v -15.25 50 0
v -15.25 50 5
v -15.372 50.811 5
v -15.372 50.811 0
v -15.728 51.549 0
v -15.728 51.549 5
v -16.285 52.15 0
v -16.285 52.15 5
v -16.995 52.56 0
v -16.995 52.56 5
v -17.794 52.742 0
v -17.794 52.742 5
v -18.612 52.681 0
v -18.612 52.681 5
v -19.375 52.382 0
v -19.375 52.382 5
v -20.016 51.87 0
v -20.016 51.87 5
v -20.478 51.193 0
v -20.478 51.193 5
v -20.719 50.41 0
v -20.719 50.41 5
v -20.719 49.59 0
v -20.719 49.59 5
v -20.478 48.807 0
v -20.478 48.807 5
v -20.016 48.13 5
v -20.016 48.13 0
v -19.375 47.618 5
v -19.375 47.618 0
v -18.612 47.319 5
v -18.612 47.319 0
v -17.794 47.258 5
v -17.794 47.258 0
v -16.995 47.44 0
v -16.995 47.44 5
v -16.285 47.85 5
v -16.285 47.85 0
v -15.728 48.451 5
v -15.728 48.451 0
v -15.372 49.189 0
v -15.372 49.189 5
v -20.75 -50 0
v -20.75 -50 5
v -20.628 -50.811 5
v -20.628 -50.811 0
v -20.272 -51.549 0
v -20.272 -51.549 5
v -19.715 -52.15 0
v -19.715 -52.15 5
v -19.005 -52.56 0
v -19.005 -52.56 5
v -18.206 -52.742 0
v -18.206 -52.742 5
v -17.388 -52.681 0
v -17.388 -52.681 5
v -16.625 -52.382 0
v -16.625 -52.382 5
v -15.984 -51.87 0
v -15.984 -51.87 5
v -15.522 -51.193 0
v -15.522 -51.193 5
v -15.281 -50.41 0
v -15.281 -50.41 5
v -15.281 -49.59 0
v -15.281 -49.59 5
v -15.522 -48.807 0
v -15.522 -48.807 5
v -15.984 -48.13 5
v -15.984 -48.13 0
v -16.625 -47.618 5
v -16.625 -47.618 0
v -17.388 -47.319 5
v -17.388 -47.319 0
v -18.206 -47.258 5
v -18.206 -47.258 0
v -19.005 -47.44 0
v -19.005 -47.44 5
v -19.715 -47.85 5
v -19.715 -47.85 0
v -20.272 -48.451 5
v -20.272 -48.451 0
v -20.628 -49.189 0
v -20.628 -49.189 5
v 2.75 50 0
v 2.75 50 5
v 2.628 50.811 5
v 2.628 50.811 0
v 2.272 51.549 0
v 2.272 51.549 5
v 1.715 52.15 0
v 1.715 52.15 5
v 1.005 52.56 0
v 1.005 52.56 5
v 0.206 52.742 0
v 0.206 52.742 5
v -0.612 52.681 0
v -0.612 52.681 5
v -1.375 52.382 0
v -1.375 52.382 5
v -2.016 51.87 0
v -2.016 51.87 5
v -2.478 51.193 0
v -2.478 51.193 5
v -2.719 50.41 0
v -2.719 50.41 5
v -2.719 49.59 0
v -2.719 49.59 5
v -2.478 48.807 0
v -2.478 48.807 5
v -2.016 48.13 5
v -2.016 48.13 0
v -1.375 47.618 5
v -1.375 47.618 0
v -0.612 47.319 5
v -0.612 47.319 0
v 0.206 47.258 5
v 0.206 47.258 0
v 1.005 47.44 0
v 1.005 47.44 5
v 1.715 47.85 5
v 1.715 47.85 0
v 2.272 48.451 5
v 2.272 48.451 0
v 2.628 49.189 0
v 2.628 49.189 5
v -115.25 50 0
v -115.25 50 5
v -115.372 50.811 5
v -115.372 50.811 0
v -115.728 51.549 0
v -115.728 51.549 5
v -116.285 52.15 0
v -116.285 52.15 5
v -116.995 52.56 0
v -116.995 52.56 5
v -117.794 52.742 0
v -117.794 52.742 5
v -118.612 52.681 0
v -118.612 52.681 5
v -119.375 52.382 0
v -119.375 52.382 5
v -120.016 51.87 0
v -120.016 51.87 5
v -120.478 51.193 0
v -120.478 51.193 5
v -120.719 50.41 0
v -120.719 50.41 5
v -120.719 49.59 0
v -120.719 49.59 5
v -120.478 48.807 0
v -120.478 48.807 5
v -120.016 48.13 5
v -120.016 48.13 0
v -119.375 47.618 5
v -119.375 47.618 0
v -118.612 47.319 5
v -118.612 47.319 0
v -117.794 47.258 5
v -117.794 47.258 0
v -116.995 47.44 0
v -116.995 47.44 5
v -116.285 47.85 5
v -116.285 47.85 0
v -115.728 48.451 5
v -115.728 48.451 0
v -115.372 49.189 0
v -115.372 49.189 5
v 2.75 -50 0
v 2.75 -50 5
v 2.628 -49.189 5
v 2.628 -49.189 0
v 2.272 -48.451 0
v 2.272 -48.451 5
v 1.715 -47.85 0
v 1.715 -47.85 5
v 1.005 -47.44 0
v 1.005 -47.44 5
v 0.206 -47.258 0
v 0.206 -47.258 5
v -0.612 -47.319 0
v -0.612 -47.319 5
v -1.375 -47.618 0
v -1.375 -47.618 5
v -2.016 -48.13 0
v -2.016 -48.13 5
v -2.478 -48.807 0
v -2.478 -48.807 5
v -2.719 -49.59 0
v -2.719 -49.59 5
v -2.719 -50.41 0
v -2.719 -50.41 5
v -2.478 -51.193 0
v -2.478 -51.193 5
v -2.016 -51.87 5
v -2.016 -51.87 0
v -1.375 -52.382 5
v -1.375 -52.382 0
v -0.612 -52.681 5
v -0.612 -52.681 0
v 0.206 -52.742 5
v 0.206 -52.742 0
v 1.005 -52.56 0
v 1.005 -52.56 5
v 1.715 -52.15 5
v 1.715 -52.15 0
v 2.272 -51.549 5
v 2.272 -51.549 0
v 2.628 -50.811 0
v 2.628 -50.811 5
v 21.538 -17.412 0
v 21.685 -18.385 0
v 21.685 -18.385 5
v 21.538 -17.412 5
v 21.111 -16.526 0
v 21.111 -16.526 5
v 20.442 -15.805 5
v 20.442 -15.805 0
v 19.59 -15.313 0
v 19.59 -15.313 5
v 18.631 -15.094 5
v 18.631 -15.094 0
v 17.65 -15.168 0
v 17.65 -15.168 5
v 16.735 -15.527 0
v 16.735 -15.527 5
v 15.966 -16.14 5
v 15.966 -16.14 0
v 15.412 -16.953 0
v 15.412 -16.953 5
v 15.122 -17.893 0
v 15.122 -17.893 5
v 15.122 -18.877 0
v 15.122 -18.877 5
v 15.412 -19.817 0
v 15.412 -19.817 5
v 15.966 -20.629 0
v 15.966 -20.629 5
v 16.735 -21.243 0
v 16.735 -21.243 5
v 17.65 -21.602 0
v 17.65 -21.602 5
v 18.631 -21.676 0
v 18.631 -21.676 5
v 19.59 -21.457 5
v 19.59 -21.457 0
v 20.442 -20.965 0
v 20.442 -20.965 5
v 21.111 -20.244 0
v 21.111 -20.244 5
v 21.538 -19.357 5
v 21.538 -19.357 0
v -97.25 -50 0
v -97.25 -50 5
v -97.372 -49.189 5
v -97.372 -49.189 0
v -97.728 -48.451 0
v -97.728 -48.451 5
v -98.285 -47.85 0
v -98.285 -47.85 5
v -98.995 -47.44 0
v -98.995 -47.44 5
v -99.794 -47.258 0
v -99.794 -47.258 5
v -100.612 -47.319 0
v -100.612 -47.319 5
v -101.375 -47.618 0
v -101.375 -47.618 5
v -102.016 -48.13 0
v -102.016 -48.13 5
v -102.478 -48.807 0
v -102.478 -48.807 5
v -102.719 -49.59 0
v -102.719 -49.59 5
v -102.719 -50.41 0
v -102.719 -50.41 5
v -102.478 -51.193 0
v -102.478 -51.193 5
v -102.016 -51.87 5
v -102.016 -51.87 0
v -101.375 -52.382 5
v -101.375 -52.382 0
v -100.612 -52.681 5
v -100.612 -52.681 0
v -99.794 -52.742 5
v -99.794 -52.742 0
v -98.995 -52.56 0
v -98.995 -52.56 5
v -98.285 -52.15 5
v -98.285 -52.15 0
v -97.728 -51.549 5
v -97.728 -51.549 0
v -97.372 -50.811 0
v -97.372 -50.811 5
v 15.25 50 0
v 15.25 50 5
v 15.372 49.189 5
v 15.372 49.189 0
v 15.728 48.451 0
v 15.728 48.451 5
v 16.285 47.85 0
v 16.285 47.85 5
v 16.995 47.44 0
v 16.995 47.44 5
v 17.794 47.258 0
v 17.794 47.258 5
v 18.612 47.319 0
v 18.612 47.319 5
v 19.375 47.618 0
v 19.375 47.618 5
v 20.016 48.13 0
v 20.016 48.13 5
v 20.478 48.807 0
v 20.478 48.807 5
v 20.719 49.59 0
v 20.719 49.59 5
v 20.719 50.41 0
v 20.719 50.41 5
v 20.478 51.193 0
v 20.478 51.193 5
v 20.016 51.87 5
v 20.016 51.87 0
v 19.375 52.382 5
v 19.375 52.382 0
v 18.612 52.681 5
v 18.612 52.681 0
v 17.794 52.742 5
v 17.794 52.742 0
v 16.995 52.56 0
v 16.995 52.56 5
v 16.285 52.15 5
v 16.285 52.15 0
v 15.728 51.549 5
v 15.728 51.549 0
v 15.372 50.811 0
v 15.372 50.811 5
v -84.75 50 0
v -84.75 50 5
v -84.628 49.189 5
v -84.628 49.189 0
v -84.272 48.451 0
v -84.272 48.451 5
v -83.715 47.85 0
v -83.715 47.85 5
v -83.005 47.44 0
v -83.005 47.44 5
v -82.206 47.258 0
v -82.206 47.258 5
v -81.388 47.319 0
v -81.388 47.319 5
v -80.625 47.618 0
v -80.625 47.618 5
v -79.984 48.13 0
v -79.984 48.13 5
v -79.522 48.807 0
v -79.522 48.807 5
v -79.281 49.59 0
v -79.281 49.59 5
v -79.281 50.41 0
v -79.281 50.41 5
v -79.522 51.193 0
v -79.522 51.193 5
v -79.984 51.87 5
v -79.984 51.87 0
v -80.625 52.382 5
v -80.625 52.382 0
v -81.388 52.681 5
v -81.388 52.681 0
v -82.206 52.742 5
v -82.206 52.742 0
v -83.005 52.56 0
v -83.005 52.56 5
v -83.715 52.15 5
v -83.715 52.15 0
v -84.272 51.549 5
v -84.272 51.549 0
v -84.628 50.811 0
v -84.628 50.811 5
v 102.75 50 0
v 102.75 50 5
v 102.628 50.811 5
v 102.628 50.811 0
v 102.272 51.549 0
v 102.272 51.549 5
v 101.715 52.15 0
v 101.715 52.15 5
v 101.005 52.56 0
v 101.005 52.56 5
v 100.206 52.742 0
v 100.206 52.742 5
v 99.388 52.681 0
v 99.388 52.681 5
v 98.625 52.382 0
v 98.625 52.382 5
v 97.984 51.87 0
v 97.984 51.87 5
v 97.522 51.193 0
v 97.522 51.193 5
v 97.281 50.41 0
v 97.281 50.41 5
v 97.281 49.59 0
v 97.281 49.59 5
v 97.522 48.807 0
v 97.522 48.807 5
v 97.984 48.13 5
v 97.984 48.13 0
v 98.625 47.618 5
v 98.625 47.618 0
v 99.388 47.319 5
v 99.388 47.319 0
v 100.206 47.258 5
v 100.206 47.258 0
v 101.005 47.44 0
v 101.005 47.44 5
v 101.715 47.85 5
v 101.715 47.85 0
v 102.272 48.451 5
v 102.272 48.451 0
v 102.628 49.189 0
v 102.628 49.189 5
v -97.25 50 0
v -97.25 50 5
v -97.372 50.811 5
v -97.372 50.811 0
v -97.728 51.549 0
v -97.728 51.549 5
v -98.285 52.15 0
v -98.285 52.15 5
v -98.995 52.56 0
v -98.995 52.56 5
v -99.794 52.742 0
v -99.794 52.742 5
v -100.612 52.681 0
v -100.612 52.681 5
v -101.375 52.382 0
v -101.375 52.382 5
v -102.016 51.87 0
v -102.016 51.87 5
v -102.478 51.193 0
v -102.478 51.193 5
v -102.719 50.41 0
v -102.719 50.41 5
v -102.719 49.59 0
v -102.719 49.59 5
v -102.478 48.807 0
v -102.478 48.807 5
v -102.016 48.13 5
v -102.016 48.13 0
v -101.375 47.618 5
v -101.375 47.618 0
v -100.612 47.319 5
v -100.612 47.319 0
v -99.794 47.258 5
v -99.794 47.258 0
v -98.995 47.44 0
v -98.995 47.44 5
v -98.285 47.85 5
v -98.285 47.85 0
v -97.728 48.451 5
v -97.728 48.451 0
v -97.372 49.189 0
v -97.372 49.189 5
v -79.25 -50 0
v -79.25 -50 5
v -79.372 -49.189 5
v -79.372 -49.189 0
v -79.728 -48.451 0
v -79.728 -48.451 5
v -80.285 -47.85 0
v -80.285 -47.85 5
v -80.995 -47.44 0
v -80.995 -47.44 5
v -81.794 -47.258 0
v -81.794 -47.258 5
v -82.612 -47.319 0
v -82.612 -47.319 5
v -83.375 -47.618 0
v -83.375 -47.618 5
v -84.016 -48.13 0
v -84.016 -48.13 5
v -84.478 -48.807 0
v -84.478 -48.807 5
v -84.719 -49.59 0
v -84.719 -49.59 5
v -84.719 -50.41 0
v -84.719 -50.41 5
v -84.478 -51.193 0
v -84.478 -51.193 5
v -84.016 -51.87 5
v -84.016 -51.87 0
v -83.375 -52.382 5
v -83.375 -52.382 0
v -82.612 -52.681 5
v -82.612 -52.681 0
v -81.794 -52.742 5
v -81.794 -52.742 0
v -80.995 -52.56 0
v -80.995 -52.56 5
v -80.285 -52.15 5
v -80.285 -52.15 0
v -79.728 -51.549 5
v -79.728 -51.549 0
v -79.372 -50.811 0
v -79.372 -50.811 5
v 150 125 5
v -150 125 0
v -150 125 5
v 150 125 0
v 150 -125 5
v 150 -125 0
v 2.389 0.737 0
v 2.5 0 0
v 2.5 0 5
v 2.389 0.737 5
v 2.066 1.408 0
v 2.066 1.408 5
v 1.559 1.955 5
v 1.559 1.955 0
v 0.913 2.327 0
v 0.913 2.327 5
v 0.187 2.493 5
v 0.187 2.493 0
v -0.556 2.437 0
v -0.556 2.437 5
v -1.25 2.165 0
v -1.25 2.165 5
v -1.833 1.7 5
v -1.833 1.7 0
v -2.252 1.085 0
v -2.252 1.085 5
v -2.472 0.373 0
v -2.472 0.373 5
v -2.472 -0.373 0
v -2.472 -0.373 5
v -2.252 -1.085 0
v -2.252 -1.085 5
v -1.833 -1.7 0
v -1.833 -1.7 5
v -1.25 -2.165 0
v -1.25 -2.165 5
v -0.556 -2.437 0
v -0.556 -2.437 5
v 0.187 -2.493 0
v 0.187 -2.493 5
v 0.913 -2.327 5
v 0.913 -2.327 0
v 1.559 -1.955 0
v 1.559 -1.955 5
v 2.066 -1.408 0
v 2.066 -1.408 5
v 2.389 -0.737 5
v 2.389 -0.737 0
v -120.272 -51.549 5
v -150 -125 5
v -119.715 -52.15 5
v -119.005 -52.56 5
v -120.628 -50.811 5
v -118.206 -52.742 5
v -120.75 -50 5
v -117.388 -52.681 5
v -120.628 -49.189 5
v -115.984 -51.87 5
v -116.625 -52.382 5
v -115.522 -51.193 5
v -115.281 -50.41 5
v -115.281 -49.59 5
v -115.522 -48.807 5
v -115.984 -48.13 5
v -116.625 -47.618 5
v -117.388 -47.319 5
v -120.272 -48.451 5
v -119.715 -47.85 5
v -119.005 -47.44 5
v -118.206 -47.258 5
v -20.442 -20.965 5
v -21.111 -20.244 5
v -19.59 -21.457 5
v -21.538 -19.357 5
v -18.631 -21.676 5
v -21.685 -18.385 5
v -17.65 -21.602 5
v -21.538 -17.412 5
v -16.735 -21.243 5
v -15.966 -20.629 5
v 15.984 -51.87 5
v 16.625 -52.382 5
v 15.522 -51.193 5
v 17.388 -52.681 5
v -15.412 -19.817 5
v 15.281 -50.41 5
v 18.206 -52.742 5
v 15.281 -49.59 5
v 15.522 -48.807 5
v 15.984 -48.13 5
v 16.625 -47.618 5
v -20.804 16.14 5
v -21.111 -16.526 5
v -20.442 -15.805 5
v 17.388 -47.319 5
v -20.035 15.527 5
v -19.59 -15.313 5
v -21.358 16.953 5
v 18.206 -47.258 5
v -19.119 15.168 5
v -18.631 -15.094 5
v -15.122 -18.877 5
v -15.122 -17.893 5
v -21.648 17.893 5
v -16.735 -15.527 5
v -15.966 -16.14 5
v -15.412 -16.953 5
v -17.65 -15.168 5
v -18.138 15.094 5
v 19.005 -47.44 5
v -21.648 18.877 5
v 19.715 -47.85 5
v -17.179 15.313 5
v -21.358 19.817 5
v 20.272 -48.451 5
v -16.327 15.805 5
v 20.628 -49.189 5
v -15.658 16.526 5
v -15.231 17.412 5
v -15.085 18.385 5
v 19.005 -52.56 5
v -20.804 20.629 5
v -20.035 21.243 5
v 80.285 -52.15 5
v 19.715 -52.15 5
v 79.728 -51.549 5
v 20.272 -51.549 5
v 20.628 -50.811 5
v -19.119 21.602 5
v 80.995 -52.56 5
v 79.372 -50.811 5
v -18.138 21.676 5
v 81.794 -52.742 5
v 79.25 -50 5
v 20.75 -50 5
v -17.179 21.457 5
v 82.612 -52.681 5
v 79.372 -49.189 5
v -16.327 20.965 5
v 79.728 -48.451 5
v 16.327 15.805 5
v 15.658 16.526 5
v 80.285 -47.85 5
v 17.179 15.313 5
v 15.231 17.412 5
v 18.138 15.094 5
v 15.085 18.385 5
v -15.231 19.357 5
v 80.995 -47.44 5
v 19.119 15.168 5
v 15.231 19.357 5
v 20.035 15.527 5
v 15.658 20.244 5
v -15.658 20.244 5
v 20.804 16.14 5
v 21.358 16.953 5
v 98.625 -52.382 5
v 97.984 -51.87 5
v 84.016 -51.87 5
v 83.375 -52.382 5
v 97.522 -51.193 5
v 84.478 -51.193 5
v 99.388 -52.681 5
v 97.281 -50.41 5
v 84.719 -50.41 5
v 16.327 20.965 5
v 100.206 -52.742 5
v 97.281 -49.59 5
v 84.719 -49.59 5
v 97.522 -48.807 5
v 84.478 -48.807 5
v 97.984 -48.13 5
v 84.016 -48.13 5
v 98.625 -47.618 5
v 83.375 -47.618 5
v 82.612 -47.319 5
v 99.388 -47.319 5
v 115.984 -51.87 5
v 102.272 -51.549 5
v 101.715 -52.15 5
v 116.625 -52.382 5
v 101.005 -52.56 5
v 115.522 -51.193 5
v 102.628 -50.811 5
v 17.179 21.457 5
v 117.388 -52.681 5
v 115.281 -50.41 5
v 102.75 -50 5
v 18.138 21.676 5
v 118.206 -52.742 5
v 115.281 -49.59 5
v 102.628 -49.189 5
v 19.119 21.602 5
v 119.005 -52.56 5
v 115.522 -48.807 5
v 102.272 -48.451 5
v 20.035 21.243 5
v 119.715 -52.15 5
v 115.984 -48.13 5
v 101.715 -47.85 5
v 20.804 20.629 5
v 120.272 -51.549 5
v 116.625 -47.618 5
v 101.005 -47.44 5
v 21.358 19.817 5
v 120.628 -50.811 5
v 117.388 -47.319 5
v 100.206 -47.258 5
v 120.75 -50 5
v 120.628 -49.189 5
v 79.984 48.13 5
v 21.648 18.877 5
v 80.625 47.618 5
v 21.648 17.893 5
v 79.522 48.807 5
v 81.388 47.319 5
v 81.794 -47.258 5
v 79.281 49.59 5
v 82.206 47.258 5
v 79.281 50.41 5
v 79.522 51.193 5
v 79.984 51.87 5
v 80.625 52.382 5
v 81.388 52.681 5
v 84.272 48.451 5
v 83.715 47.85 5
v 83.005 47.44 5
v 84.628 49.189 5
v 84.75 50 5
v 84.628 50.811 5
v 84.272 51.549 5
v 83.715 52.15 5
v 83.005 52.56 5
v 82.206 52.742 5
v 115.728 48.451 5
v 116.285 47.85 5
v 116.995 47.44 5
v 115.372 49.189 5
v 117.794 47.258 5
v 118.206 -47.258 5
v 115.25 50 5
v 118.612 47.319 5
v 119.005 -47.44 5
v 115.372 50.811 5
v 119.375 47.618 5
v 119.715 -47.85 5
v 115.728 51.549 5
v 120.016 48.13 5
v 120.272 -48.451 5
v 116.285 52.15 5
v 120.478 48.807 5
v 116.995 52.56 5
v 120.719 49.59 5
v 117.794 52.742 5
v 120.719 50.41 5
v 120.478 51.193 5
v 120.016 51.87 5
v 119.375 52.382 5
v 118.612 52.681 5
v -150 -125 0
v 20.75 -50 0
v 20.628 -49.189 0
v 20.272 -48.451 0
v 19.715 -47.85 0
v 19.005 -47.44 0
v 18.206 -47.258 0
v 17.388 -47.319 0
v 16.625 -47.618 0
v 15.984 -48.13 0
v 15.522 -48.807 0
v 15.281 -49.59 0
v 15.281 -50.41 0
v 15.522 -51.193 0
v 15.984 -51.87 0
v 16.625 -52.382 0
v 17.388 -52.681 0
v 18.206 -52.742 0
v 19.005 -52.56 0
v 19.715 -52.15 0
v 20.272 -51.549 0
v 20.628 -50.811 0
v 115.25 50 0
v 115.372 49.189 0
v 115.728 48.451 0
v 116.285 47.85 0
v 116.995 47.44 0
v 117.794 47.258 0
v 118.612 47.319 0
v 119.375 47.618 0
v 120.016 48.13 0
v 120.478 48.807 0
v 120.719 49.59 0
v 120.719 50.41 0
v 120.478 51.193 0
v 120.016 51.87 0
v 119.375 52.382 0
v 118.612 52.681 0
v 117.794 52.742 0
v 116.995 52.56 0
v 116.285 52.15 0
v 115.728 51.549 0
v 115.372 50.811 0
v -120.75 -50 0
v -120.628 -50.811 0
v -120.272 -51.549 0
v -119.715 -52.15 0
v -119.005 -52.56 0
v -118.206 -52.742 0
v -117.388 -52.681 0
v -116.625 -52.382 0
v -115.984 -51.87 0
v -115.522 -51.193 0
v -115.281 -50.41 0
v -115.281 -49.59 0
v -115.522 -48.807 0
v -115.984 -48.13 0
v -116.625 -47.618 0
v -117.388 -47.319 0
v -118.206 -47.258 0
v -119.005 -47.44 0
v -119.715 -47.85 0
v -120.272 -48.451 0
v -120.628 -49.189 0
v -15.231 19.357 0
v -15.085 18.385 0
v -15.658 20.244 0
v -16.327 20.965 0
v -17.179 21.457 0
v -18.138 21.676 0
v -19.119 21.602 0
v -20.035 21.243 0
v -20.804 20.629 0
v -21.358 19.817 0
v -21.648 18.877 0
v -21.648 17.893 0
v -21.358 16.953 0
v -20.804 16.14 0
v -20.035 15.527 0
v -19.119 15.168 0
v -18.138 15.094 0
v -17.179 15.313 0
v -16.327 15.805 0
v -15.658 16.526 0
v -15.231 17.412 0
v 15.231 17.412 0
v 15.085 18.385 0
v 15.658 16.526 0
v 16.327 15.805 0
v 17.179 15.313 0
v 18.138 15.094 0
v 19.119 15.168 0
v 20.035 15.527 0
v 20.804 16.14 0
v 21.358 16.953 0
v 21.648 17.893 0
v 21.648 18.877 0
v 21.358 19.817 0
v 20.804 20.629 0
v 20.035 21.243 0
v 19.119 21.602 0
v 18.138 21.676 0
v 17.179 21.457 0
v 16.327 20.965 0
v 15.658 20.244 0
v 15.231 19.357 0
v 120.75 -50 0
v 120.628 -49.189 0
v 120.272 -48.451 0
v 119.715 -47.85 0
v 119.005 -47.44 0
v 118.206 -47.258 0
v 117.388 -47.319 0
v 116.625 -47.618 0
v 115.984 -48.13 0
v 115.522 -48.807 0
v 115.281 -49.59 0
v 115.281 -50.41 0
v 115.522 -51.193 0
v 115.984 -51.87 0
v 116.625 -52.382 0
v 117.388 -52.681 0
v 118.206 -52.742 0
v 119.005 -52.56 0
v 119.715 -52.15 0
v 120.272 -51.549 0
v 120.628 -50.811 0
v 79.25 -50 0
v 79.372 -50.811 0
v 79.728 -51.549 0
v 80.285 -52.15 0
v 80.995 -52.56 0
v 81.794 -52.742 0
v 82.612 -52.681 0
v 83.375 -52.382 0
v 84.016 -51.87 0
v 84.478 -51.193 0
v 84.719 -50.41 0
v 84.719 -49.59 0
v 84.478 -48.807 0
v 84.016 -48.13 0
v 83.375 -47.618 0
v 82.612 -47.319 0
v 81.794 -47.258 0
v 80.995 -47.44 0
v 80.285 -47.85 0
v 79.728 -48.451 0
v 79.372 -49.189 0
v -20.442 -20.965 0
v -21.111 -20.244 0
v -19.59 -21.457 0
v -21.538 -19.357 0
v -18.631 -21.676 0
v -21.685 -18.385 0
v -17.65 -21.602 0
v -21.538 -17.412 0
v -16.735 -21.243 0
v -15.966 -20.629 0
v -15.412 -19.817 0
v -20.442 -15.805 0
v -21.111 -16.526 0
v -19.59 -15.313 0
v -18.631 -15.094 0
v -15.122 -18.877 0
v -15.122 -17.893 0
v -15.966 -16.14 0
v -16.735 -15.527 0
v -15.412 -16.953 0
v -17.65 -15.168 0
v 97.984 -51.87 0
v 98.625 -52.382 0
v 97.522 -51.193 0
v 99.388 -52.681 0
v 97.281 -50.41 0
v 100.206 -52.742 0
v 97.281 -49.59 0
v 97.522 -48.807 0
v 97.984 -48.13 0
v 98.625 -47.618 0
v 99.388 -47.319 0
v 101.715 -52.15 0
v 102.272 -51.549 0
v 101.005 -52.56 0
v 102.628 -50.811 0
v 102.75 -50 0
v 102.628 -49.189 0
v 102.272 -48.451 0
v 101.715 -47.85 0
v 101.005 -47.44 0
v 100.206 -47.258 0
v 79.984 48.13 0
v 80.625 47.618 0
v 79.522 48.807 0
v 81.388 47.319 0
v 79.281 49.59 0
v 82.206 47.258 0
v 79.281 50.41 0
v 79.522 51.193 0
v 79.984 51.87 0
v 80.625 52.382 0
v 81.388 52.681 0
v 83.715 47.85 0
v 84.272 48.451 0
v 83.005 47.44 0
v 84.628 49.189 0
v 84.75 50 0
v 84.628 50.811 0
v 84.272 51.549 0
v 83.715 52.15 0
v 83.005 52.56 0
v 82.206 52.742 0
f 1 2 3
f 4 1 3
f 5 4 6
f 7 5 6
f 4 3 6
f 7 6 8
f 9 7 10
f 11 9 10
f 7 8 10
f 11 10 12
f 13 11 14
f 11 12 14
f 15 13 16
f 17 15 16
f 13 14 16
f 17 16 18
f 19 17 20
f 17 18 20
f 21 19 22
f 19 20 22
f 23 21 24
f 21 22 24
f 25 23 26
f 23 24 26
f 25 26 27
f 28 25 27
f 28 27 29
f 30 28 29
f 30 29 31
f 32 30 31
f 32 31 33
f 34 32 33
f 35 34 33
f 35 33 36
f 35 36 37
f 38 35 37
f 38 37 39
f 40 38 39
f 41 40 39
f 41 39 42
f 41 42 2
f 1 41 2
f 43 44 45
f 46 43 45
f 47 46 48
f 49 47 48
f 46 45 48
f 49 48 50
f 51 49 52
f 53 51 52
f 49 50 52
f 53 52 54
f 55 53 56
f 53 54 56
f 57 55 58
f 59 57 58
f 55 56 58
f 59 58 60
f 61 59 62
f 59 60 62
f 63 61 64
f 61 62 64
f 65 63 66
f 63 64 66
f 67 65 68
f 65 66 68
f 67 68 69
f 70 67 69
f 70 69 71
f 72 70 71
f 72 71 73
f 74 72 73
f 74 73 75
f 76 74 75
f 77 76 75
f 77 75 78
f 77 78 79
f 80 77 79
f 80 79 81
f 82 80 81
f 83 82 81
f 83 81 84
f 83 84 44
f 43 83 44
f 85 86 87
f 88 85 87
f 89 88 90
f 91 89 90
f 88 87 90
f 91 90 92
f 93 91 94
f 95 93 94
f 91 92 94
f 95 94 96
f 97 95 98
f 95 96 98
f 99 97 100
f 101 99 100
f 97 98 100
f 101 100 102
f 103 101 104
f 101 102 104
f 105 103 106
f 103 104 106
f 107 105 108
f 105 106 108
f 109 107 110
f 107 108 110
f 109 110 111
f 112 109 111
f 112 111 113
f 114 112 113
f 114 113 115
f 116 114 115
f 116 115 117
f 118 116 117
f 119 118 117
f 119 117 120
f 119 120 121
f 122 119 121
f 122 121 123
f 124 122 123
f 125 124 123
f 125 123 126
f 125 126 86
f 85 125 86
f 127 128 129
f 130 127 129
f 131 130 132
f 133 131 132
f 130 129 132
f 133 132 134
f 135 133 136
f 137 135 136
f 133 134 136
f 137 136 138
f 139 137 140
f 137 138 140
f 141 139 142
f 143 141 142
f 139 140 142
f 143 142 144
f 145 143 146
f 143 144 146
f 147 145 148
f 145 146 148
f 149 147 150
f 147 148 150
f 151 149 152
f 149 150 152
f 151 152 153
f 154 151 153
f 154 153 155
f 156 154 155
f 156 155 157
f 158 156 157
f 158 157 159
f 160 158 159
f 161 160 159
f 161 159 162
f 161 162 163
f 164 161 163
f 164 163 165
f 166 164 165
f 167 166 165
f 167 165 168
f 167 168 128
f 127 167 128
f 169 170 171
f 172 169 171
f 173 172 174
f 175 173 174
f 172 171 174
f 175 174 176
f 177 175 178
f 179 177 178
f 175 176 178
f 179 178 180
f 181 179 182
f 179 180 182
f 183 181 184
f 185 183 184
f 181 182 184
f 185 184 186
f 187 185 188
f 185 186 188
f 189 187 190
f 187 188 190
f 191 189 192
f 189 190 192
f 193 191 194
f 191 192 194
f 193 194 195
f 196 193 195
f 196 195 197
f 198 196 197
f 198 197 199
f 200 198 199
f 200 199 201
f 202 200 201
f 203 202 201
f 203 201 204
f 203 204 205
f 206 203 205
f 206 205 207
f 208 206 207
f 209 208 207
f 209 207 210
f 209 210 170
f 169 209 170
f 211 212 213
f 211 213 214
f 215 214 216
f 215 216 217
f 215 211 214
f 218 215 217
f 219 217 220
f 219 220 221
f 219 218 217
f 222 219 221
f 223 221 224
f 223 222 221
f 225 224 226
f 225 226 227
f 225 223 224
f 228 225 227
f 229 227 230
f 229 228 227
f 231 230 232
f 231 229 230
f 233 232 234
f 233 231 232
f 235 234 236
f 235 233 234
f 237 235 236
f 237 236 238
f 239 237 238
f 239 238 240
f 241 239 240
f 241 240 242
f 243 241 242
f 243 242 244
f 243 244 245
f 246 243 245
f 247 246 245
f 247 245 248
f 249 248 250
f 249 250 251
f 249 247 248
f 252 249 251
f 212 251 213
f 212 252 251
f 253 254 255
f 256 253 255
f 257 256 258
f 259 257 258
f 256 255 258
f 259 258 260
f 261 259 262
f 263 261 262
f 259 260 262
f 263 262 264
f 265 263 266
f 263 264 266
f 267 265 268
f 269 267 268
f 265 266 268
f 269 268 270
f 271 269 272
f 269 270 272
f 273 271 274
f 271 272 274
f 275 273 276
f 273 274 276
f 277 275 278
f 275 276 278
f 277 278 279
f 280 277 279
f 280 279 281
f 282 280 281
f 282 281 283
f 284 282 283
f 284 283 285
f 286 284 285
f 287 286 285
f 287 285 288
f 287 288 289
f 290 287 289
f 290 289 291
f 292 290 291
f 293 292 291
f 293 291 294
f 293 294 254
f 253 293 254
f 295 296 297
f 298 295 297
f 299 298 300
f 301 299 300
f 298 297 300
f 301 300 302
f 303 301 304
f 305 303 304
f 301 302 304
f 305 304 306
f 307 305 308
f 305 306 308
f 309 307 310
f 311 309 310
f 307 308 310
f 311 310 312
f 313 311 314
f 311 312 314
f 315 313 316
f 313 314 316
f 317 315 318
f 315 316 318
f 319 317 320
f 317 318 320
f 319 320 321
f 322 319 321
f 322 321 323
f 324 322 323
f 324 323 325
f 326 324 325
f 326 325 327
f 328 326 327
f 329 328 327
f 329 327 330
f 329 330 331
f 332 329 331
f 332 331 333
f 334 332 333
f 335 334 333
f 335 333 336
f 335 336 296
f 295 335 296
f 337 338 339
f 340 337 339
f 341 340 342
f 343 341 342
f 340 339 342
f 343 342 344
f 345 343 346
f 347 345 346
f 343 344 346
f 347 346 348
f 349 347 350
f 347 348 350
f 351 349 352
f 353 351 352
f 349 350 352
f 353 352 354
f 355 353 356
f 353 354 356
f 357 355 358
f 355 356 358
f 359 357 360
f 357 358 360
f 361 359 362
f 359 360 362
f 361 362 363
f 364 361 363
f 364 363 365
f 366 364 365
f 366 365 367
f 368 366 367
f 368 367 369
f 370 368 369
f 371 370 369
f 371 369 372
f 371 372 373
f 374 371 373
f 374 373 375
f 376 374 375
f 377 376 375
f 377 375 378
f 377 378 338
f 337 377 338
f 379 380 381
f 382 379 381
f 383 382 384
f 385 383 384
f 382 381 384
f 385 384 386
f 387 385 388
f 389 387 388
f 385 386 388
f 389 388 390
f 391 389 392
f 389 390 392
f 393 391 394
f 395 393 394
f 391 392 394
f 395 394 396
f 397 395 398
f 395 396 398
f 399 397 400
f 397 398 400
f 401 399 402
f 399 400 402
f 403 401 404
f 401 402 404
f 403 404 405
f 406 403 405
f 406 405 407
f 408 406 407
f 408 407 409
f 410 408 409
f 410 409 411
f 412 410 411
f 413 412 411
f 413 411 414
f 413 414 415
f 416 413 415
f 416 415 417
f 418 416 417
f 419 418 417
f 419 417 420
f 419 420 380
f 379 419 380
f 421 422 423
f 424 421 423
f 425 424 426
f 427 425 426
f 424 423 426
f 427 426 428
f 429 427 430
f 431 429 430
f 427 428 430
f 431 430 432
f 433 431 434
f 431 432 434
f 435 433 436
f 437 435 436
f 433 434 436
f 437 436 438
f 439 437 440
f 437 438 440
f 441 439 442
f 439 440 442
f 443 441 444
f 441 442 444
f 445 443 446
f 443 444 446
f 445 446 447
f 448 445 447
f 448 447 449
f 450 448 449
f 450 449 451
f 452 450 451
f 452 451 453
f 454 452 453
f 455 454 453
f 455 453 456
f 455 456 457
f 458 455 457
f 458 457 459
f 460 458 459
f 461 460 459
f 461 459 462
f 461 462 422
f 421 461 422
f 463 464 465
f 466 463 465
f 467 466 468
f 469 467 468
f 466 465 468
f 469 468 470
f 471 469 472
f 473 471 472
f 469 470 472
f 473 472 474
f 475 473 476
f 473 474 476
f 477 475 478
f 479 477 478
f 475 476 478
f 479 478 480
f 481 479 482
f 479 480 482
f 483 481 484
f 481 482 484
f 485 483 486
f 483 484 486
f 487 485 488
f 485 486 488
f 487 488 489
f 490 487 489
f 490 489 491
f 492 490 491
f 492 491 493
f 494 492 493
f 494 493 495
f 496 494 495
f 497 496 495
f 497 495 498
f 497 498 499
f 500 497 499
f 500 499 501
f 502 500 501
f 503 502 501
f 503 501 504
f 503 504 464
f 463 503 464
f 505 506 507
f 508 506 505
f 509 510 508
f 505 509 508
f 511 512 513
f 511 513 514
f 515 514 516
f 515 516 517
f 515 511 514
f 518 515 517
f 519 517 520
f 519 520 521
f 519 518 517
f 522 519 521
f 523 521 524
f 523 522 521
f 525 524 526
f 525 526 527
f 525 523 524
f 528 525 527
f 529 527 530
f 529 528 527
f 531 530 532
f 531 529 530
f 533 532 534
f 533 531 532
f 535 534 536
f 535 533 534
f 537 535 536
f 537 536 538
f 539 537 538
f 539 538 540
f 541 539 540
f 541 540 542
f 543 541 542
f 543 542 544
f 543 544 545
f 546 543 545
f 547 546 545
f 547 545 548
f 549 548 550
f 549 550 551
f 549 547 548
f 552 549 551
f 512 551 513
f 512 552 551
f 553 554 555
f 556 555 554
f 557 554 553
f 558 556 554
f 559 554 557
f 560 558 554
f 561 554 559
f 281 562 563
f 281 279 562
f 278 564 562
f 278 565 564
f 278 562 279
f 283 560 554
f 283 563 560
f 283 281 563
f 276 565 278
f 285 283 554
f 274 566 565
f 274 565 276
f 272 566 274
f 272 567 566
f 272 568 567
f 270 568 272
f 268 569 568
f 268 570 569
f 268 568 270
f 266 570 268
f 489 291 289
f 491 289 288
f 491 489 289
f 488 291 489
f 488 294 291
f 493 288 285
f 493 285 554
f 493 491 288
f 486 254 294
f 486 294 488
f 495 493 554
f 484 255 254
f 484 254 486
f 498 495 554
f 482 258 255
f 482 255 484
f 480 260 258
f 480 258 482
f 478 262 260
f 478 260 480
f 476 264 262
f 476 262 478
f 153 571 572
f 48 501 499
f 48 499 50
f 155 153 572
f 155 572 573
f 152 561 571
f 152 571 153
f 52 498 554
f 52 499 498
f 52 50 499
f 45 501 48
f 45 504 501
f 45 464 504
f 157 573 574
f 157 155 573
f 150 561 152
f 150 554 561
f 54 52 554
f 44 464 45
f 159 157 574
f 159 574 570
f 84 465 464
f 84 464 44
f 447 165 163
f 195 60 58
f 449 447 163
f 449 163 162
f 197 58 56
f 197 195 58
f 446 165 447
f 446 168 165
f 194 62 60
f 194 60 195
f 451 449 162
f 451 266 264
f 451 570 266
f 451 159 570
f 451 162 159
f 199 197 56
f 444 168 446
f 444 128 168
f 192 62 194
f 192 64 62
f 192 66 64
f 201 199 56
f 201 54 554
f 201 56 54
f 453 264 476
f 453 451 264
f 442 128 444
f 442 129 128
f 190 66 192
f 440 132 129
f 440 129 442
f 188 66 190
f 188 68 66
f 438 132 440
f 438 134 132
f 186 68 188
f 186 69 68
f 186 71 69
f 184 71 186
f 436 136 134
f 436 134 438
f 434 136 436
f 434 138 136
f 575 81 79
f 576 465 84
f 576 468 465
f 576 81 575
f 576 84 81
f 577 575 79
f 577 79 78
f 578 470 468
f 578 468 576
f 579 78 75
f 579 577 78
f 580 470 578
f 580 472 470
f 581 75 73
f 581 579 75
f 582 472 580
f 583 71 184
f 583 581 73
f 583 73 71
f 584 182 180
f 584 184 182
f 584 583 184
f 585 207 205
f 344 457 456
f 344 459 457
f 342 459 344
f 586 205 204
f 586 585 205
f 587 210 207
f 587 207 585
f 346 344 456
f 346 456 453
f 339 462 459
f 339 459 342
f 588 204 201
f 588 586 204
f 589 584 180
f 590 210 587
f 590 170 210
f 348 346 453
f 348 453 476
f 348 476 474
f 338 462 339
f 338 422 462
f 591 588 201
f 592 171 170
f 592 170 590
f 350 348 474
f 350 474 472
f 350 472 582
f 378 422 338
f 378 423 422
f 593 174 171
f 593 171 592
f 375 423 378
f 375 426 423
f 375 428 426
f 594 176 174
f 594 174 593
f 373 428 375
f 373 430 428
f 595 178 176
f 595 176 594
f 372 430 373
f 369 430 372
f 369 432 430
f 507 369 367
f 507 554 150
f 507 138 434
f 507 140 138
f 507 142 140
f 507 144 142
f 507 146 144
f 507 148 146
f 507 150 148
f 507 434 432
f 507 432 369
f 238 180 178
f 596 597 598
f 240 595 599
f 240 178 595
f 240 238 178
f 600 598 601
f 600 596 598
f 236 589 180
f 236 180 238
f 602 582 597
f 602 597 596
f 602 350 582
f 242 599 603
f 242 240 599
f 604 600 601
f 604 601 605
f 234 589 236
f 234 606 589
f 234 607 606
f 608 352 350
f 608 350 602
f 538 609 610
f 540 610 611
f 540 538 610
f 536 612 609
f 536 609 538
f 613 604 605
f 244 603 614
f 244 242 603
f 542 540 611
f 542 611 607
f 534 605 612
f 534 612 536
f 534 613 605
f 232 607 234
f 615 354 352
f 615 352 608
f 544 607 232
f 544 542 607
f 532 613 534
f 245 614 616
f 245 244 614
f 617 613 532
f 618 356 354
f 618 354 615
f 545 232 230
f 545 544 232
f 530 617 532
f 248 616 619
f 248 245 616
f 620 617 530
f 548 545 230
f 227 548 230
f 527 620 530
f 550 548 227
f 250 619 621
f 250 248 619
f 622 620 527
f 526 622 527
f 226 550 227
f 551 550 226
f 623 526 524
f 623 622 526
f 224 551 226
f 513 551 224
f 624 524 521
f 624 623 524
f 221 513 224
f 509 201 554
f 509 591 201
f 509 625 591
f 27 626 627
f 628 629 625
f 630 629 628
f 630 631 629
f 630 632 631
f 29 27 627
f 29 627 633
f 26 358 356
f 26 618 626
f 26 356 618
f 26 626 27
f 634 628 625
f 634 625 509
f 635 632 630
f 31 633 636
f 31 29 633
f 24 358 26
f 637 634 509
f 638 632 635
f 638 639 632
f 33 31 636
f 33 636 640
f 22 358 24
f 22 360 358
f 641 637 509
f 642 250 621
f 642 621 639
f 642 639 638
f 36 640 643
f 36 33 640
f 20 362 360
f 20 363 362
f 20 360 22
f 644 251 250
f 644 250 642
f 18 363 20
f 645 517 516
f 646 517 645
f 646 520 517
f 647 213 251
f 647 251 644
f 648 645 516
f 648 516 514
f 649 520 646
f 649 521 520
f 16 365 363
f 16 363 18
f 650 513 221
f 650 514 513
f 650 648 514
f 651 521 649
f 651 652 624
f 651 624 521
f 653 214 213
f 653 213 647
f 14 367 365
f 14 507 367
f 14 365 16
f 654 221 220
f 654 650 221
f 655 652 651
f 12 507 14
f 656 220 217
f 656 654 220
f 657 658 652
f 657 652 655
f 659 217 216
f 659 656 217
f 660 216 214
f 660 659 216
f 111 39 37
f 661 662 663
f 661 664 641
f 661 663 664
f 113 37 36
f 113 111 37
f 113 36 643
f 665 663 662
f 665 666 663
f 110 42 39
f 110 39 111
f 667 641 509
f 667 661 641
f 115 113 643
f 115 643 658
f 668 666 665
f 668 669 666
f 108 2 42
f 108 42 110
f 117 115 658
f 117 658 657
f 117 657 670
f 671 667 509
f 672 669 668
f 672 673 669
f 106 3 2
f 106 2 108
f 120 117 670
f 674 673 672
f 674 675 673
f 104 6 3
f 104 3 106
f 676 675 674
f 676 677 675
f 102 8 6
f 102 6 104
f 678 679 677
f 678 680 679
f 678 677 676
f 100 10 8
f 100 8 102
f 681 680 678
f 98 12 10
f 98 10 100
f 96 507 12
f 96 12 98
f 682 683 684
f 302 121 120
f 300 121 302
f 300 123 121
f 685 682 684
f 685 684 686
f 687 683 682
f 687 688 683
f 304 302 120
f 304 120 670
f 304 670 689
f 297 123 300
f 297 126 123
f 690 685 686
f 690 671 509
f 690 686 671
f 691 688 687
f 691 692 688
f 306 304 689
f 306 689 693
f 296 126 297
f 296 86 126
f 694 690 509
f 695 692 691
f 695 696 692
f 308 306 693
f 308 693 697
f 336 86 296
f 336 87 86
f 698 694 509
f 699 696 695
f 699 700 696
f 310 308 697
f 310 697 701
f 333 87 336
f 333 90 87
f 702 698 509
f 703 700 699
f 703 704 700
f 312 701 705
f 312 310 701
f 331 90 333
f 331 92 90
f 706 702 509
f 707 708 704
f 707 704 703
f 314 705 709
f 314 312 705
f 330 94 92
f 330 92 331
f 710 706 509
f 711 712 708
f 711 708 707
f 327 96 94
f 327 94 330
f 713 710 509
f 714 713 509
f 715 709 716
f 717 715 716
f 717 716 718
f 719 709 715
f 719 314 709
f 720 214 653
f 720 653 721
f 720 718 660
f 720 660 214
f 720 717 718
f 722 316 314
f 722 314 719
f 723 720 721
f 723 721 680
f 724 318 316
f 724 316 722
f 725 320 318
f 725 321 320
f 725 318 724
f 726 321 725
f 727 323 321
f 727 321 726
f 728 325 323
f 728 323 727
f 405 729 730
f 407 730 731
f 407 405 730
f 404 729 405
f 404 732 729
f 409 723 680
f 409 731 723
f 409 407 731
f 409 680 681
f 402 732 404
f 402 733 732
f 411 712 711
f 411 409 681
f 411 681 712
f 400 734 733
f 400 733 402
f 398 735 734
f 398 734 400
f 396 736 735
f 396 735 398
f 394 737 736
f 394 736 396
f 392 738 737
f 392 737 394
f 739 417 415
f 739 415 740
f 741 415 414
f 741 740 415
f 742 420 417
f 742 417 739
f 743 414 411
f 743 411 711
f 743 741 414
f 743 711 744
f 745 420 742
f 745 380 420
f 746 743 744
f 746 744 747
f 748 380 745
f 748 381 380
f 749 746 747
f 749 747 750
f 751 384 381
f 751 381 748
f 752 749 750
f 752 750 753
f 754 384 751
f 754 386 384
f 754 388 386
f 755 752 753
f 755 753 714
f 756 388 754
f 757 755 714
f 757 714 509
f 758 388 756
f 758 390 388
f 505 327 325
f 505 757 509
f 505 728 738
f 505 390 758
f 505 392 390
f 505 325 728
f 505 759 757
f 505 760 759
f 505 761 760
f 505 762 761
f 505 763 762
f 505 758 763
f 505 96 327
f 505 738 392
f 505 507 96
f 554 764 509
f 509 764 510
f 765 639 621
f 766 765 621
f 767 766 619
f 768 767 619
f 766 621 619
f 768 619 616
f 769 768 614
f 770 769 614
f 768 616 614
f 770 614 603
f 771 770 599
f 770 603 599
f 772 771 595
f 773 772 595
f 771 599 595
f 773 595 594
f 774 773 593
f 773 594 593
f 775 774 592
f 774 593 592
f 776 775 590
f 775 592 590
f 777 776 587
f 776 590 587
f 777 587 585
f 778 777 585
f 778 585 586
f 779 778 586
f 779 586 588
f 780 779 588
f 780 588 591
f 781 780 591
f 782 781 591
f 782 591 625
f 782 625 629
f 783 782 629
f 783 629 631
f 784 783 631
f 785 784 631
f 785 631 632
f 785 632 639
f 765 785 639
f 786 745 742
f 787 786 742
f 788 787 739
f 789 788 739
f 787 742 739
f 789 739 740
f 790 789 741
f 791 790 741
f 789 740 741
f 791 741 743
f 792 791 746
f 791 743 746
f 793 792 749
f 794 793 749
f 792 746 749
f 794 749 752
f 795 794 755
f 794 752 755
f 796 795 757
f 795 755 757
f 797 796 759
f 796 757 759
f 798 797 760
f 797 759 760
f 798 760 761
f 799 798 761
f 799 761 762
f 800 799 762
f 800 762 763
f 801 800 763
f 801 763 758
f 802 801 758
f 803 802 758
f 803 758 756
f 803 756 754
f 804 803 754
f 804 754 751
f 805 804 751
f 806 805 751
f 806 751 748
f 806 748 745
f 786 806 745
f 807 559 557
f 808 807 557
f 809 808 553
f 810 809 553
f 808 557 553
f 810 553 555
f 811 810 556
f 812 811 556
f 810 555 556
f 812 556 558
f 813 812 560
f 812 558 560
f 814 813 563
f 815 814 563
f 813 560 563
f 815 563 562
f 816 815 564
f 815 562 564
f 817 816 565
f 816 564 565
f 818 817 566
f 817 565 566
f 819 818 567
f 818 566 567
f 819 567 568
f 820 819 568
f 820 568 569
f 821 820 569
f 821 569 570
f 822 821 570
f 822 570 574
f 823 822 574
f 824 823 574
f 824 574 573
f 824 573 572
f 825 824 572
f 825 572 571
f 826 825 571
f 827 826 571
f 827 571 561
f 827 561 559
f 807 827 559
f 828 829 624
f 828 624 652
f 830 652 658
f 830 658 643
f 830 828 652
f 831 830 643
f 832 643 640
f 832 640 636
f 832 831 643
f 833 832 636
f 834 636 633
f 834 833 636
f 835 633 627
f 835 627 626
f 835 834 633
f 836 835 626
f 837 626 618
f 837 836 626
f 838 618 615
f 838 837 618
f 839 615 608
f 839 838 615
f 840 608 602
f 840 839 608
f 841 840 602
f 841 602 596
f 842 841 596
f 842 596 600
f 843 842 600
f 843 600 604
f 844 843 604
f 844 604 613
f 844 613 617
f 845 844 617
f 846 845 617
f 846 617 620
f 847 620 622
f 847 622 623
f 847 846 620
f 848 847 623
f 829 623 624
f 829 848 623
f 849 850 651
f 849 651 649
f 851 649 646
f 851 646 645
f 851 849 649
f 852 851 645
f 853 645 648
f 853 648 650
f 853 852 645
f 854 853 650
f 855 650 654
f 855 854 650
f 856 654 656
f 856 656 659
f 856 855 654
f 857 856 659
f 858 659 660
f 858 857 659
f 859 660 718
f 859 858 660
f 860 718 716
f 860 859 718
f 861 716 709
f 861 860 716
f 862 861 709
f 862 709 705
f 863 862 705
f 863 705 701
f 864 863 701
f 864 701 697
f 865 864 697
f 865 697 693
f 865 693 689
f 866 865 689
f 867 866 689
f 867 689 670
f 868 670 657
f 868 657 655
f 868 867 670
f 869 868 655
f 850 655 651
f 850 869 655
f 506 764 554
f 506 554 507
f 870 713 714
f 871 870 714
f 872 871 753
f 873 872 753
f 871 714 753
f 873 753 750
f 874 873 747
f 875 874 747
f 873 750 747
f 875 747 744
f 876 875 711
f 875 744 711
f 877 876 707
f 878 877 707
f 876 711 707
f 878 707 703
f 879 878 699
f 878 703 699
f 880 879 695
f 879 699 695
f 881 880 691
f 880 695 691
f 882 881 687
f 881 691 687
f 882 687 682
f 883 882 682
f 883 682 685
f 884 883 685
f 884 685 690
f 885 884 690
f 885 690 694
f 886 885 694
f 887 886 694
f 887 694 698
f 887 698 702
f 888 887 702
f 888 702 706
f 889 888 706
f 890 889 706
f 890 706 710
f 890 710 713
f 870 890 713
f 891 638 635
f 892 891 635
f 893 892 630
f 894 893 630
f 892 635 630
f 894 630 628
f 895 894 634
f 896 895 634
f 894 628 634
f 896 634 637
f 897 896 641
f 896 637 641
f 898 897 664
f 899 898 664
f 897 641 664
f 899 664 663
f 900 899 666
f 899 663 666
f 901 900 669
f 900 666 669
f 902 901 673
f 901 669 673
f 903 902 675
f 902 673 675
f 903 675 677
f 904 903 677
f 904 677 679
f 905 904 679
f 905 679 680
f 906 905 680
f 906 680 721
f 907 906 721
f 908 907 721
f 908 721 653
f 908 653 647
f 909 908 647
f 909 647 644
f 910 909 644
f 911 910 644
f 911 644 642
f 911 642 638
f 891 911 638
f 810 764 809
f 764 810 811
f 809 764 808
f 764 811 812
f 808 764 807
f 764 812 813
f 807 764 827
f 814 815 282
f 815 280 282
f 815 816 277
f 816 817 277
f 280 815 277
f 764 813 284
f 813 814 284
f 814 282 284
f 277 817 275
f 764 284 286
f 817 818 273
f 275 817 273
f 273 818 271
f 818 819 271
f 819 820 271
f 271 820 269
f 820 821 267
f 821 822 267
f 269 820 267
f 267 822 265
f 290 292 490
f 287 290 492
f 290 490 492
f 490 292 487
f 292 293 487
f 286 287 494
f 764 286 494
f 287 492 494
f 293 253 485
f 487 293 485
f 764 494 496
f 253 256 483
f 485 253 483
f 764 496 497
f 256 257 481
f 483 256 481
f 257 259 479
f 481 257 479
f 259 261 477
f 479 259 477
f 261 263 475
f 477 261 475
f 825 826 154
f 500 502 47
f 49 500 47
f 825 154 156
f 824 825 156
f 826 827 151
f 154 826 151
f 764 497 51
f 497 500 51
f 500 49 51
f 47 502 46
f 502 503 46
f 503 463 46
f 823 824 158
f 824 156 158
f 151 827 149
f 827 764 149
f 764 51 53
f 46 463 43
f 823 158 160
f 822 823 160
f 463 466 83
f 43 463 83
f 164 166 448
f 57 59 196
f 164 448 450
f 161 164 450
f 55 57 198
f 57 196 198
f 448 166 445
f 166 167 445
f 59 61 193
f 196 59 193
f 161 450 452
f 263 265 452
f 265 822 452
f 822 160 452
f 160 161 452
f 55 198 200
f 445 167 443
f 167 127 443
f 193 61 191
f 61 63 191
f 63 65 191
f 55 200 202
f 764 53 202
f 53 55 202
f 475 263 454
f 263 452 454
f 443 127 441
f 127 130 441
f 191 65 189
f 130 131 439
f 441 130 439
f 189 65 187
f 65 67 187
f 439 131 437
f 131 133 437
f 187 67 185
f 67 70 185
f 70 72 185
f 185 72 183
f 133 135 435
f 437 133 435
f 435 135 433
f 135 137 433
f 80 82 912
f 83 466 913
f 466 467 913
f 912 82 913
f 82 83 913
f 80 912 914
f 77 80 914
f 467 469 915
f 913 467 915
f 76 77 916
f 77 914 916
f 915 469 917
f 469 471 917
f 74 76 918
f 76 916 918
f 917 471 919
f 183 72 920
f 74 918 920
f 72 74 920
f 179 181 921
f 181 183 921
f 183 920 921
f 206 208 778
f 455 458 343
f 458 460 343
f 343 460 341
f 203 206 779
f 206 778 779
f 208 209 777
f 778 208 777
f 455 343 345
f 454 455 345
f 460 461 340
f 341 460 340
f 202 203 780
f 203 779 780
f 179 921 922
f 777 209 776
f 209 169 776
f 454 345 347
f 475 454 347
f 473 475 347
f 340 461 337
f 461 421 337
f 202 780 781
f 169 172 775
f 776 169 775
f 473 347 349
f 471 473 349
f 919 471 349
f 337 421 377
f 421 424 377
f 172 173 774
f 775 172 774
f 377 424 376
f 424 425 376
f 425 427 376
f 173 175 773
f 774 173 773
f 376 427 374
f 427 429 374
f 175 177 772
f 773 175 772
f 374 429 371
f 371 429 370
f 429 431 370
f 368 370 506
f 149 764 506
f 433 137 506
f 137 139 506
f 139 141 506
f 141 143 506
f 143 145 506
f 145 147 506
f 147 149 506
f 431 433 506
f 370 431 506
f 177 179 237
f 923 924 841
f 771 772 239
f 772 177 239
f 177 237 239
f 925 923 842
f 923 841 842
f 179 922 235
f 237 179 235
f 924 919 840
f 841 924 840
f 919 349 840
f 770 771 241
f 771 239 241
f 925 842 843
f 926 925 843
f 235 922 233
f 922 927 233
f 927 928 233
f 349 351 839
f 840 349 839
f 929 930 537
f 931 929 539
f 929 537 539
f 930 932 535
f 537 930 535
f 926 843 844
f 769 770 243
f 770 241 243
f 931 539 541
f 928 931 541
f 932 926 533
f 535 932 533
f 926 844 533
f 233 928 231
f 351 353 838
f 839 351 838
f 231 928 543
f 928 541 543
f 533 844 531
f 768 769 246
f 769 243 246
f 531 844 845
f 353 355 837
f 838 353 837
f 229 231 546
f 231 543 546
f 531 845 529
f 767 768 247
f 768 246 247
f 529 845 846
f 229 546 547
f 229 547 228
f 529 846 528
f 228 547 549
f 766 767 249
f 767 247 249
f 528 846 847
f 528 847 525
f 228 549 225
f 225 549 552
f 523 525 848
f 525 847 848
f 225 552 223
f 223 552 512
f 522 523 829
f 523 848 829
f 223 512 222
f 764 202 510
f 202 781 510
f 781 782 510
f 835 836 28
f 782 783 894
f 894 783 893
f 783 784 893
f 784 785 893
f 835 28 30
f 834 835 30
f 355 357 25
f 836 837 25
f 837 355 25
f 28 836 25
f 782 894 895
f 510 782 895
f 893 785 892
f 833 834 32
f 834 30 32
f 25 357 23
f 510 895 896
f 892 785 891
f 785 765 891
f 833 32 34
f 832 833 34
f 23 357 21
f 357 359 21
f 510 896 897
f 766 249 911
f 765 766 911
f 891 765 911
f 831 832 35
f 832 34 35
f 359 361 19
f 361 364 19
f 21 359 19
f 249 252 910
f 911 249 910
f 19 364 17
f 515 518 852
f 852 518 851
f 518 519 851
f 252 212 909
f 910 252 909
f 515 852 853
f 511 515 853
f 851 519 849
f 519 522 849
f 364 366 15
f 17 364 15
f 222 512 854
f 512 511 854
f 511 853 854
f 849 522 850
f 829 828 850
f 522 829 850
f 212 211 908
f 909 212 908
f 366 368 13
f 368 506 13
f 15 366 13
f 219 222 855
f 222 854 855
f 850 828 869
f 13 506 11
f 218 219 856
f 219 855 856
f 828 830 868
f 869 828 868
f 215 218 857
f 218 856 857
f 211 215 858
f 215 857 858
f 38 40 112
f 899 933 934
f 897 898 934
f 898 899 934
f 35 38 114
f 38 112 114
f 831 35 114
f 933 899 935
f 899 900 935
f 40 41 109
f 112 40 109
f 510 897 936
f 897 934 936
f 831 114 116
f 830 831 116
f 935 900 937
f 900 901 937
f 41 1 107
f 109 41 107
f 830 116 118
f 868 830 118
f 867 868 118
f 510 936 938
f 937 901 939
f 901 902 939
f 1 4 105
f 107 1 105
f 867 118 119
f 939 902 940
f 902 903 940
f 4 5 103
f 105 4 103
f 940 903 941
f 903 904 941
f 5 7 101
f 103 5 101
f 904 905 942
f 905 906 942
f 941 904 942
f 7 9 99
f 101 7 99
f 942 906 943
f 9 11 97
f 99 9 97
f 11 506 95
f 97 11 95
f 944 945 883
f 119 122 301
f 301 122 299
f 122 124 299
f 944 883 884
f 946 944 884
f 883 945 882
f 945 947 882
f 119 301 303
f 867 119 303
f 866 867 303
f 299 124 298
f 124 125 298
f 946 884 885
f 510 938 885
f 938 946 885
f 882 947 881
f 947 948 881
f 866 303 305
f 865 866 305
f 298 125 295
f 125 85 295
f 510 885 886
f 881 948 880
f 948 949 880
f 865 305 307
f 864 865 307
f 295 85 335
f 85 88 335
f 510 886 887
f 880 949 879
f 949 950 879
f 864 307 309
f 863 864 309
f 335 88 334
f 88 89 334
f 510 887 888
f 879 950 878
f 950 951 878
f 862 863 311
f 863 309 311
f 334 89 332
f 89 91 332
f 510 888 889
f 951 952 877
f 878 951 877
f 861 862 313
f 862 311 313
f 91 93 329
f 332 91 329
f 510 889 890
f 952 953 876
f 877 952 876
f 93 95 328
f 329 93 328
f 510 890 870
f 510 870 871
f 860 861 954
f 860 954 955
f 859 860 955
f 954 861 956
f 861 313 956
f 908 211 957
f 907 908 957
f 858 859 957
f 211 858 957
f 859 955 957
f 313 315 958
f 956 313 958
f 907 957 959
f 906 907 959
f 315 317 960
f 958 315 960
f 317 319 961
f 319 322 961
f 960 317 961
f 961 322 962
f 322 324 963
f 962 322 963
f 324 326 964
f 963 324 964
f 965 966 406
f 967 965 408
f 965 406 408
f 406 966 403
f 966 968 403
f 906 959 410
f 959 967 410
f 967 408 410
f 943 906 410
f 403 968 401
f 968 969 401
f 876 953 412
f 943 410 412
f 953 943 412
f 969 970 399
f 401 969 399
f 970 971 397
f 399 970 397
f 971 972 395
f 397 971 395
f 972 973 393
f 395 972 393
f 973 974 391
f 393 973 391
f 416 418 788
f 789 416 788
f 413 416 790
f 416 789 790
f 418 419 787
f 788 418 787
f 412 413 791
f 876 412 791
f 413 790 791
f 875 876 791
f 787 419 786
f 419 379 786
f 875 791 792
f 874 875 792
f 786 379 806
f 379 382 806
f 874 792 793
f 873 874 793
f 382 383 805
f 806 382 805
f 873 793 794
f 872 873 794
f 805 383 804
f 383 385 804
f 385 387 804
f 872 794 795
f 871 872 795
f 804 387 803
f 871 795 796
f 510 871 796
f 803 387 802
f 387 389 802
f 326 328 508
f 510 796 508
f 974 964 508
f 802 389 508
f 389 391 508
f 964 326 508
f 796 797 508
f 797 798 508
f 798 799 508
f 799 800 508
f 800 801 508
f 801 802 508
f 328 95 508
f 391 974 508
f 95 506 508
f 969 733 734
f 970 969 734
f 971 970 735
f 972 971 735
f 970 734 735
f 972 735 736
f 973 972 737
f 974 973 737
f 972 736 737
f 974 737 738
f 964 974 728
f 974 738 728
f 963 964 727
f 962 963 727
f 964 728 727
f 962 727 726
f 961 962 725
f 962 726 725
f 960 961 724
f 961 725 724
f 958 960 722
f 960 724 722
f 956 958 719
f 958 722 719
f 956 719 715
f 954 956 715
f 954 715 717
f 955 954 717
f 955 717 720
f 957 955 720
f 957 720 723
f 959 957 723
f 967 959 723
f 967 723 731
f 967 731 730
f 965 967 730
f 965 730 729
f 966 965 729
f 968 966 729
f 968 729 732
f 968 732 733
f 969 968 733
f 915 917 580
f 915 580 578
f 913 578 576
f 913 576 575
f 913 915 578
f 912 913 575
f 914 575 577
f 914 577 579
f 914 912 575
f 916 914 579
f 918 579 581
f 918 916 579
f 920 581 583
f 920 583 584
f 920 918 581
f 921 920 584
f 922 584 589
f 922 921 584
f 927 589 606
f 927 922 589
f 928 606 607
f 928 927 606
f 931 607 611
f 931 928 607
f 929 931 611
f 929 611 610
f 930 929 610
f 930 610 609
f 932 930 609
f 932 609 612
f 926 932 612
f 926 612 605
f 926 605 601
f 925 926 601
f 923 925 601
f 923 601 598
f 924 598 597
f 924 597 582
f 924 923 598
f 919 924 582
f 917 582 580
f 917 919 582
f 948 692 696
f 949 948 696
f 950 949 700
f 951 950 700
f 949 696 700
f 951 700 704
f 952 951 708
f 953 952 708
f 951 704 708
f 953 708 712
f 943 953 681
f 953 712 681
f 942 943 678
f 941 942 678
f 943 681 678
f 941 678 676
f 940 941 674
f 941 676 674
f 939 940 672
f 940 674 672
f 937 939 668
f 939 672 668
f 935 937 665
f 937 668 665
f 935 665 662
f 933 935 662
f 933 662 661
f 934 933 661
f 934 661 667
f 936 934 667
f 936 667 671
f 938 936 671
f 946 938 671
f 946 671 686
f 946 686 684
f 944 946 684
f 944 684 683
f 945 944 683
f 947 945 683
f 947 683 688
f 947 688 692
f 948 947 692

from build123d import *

# Parameters (mm, degrees)
SKETCH_1_W          = 300
SKETCH_1_H          = 250
SKETCH_1_R          = 3.3
SKETCH_1_R_2        = 2.5
EXTRUDE_1_DEPTH     = 5
SKETCH_2_R          = 2.75
CUT_EXTRUDE_1_DEPTH = 196.320249846


with BuildPart() as part:
    # 草图1 → 凸台-拉伸1 (new body)
    with BuildSketch(Plane.XY):
        Rectangle(SKETCH_1_W, SKETCH_1_H)
        with Locations((-18.384776311, 18.384776311)):
            Circle(SKETCH_1_R, mode=Mode.SUBTRACT)
        with Locations(Location((18.384776311, 18.384776311, 0), (0, 0, 180))):
            Circle(SKETCH_1_R, mode=Mode.SUBTRACT)
        with Locations((18.384776311, -18.384776311)):
            Circle(SKETCH_1_R, mode=Mode.SUBTRACT)
        with Locations(Location((-18.384776311, -18.384776311, 0), (0, 0, 180))):
            Circle(SKETCH_1_R, mode=Mode.SUBTRACT)
        Circle(SKETCH_1_R_2, mode=Mode.SUBTRACT)
    extrude(amount=EXTRUDE_1_DEPTH)

    # 草图2 → 切除-拉伸1 (cut, through all)
    with BuildSketch(Plane.XY.offset(5)):
        with Locations((-100, 50)):
            Circle(SKETCH_2_R)
        with Locations((0, 50)):
            Circle(SKETCH_2_R)
        with Locations((100, 50)):
            Circle(SKETCH_2_R)
        with Locations((100, -50)):
            Circle(SKETCH_2_R)
        with Locations((0, -50)):
            Circle(SKETCH_2_R)
        with Locations((-100, -50)):
            Circle(SKETCH_2_R)
        with Locations((-118, 50)):
            Circle(SKETCH_2_R)
        with Locations(Location((-82, 50, 0), (0, 0, 180))):
            Circle(SKETCH_2_R)
        with Locations((-82, -50)):
            Circle(SKETCH_2_R)
        with Locations(Location((-118, -50, 0), (0, 0, 180))):
            Circle(SKETCH_2_R)
        with Locations((-18, 50)):
            Circle(SKETCH_2_R)
        with Locations(Location((-18, -50, 0), (0, 0, 180))):
            Circle(SKETCH_2_R)
        with Locations((118, -50)):
            Circle(SKETCH_2_R)
        with Locations(Location((82, -50, 0), (0, 0, 180))):
            Circle(SKETCH_2_R)
        with Locations((18, -50)):
            Circle(SKETCH_2_R)
        with Locations(Location((18, 50, 0), (0, 0, 180))):
            Circle(SKETCH_2_R)
        with Locations((82, 50)):
            Circle(SKETCH_2_R)
        with Locations(Location((118, 50, 0), (0, 0, 180))):
            Circle(SKETCH_2_R)
    extrude(amount=-CUT_EXTRUDE_1_DEPTH, mode=Mode.SUBTRACT)


solid = part.part
